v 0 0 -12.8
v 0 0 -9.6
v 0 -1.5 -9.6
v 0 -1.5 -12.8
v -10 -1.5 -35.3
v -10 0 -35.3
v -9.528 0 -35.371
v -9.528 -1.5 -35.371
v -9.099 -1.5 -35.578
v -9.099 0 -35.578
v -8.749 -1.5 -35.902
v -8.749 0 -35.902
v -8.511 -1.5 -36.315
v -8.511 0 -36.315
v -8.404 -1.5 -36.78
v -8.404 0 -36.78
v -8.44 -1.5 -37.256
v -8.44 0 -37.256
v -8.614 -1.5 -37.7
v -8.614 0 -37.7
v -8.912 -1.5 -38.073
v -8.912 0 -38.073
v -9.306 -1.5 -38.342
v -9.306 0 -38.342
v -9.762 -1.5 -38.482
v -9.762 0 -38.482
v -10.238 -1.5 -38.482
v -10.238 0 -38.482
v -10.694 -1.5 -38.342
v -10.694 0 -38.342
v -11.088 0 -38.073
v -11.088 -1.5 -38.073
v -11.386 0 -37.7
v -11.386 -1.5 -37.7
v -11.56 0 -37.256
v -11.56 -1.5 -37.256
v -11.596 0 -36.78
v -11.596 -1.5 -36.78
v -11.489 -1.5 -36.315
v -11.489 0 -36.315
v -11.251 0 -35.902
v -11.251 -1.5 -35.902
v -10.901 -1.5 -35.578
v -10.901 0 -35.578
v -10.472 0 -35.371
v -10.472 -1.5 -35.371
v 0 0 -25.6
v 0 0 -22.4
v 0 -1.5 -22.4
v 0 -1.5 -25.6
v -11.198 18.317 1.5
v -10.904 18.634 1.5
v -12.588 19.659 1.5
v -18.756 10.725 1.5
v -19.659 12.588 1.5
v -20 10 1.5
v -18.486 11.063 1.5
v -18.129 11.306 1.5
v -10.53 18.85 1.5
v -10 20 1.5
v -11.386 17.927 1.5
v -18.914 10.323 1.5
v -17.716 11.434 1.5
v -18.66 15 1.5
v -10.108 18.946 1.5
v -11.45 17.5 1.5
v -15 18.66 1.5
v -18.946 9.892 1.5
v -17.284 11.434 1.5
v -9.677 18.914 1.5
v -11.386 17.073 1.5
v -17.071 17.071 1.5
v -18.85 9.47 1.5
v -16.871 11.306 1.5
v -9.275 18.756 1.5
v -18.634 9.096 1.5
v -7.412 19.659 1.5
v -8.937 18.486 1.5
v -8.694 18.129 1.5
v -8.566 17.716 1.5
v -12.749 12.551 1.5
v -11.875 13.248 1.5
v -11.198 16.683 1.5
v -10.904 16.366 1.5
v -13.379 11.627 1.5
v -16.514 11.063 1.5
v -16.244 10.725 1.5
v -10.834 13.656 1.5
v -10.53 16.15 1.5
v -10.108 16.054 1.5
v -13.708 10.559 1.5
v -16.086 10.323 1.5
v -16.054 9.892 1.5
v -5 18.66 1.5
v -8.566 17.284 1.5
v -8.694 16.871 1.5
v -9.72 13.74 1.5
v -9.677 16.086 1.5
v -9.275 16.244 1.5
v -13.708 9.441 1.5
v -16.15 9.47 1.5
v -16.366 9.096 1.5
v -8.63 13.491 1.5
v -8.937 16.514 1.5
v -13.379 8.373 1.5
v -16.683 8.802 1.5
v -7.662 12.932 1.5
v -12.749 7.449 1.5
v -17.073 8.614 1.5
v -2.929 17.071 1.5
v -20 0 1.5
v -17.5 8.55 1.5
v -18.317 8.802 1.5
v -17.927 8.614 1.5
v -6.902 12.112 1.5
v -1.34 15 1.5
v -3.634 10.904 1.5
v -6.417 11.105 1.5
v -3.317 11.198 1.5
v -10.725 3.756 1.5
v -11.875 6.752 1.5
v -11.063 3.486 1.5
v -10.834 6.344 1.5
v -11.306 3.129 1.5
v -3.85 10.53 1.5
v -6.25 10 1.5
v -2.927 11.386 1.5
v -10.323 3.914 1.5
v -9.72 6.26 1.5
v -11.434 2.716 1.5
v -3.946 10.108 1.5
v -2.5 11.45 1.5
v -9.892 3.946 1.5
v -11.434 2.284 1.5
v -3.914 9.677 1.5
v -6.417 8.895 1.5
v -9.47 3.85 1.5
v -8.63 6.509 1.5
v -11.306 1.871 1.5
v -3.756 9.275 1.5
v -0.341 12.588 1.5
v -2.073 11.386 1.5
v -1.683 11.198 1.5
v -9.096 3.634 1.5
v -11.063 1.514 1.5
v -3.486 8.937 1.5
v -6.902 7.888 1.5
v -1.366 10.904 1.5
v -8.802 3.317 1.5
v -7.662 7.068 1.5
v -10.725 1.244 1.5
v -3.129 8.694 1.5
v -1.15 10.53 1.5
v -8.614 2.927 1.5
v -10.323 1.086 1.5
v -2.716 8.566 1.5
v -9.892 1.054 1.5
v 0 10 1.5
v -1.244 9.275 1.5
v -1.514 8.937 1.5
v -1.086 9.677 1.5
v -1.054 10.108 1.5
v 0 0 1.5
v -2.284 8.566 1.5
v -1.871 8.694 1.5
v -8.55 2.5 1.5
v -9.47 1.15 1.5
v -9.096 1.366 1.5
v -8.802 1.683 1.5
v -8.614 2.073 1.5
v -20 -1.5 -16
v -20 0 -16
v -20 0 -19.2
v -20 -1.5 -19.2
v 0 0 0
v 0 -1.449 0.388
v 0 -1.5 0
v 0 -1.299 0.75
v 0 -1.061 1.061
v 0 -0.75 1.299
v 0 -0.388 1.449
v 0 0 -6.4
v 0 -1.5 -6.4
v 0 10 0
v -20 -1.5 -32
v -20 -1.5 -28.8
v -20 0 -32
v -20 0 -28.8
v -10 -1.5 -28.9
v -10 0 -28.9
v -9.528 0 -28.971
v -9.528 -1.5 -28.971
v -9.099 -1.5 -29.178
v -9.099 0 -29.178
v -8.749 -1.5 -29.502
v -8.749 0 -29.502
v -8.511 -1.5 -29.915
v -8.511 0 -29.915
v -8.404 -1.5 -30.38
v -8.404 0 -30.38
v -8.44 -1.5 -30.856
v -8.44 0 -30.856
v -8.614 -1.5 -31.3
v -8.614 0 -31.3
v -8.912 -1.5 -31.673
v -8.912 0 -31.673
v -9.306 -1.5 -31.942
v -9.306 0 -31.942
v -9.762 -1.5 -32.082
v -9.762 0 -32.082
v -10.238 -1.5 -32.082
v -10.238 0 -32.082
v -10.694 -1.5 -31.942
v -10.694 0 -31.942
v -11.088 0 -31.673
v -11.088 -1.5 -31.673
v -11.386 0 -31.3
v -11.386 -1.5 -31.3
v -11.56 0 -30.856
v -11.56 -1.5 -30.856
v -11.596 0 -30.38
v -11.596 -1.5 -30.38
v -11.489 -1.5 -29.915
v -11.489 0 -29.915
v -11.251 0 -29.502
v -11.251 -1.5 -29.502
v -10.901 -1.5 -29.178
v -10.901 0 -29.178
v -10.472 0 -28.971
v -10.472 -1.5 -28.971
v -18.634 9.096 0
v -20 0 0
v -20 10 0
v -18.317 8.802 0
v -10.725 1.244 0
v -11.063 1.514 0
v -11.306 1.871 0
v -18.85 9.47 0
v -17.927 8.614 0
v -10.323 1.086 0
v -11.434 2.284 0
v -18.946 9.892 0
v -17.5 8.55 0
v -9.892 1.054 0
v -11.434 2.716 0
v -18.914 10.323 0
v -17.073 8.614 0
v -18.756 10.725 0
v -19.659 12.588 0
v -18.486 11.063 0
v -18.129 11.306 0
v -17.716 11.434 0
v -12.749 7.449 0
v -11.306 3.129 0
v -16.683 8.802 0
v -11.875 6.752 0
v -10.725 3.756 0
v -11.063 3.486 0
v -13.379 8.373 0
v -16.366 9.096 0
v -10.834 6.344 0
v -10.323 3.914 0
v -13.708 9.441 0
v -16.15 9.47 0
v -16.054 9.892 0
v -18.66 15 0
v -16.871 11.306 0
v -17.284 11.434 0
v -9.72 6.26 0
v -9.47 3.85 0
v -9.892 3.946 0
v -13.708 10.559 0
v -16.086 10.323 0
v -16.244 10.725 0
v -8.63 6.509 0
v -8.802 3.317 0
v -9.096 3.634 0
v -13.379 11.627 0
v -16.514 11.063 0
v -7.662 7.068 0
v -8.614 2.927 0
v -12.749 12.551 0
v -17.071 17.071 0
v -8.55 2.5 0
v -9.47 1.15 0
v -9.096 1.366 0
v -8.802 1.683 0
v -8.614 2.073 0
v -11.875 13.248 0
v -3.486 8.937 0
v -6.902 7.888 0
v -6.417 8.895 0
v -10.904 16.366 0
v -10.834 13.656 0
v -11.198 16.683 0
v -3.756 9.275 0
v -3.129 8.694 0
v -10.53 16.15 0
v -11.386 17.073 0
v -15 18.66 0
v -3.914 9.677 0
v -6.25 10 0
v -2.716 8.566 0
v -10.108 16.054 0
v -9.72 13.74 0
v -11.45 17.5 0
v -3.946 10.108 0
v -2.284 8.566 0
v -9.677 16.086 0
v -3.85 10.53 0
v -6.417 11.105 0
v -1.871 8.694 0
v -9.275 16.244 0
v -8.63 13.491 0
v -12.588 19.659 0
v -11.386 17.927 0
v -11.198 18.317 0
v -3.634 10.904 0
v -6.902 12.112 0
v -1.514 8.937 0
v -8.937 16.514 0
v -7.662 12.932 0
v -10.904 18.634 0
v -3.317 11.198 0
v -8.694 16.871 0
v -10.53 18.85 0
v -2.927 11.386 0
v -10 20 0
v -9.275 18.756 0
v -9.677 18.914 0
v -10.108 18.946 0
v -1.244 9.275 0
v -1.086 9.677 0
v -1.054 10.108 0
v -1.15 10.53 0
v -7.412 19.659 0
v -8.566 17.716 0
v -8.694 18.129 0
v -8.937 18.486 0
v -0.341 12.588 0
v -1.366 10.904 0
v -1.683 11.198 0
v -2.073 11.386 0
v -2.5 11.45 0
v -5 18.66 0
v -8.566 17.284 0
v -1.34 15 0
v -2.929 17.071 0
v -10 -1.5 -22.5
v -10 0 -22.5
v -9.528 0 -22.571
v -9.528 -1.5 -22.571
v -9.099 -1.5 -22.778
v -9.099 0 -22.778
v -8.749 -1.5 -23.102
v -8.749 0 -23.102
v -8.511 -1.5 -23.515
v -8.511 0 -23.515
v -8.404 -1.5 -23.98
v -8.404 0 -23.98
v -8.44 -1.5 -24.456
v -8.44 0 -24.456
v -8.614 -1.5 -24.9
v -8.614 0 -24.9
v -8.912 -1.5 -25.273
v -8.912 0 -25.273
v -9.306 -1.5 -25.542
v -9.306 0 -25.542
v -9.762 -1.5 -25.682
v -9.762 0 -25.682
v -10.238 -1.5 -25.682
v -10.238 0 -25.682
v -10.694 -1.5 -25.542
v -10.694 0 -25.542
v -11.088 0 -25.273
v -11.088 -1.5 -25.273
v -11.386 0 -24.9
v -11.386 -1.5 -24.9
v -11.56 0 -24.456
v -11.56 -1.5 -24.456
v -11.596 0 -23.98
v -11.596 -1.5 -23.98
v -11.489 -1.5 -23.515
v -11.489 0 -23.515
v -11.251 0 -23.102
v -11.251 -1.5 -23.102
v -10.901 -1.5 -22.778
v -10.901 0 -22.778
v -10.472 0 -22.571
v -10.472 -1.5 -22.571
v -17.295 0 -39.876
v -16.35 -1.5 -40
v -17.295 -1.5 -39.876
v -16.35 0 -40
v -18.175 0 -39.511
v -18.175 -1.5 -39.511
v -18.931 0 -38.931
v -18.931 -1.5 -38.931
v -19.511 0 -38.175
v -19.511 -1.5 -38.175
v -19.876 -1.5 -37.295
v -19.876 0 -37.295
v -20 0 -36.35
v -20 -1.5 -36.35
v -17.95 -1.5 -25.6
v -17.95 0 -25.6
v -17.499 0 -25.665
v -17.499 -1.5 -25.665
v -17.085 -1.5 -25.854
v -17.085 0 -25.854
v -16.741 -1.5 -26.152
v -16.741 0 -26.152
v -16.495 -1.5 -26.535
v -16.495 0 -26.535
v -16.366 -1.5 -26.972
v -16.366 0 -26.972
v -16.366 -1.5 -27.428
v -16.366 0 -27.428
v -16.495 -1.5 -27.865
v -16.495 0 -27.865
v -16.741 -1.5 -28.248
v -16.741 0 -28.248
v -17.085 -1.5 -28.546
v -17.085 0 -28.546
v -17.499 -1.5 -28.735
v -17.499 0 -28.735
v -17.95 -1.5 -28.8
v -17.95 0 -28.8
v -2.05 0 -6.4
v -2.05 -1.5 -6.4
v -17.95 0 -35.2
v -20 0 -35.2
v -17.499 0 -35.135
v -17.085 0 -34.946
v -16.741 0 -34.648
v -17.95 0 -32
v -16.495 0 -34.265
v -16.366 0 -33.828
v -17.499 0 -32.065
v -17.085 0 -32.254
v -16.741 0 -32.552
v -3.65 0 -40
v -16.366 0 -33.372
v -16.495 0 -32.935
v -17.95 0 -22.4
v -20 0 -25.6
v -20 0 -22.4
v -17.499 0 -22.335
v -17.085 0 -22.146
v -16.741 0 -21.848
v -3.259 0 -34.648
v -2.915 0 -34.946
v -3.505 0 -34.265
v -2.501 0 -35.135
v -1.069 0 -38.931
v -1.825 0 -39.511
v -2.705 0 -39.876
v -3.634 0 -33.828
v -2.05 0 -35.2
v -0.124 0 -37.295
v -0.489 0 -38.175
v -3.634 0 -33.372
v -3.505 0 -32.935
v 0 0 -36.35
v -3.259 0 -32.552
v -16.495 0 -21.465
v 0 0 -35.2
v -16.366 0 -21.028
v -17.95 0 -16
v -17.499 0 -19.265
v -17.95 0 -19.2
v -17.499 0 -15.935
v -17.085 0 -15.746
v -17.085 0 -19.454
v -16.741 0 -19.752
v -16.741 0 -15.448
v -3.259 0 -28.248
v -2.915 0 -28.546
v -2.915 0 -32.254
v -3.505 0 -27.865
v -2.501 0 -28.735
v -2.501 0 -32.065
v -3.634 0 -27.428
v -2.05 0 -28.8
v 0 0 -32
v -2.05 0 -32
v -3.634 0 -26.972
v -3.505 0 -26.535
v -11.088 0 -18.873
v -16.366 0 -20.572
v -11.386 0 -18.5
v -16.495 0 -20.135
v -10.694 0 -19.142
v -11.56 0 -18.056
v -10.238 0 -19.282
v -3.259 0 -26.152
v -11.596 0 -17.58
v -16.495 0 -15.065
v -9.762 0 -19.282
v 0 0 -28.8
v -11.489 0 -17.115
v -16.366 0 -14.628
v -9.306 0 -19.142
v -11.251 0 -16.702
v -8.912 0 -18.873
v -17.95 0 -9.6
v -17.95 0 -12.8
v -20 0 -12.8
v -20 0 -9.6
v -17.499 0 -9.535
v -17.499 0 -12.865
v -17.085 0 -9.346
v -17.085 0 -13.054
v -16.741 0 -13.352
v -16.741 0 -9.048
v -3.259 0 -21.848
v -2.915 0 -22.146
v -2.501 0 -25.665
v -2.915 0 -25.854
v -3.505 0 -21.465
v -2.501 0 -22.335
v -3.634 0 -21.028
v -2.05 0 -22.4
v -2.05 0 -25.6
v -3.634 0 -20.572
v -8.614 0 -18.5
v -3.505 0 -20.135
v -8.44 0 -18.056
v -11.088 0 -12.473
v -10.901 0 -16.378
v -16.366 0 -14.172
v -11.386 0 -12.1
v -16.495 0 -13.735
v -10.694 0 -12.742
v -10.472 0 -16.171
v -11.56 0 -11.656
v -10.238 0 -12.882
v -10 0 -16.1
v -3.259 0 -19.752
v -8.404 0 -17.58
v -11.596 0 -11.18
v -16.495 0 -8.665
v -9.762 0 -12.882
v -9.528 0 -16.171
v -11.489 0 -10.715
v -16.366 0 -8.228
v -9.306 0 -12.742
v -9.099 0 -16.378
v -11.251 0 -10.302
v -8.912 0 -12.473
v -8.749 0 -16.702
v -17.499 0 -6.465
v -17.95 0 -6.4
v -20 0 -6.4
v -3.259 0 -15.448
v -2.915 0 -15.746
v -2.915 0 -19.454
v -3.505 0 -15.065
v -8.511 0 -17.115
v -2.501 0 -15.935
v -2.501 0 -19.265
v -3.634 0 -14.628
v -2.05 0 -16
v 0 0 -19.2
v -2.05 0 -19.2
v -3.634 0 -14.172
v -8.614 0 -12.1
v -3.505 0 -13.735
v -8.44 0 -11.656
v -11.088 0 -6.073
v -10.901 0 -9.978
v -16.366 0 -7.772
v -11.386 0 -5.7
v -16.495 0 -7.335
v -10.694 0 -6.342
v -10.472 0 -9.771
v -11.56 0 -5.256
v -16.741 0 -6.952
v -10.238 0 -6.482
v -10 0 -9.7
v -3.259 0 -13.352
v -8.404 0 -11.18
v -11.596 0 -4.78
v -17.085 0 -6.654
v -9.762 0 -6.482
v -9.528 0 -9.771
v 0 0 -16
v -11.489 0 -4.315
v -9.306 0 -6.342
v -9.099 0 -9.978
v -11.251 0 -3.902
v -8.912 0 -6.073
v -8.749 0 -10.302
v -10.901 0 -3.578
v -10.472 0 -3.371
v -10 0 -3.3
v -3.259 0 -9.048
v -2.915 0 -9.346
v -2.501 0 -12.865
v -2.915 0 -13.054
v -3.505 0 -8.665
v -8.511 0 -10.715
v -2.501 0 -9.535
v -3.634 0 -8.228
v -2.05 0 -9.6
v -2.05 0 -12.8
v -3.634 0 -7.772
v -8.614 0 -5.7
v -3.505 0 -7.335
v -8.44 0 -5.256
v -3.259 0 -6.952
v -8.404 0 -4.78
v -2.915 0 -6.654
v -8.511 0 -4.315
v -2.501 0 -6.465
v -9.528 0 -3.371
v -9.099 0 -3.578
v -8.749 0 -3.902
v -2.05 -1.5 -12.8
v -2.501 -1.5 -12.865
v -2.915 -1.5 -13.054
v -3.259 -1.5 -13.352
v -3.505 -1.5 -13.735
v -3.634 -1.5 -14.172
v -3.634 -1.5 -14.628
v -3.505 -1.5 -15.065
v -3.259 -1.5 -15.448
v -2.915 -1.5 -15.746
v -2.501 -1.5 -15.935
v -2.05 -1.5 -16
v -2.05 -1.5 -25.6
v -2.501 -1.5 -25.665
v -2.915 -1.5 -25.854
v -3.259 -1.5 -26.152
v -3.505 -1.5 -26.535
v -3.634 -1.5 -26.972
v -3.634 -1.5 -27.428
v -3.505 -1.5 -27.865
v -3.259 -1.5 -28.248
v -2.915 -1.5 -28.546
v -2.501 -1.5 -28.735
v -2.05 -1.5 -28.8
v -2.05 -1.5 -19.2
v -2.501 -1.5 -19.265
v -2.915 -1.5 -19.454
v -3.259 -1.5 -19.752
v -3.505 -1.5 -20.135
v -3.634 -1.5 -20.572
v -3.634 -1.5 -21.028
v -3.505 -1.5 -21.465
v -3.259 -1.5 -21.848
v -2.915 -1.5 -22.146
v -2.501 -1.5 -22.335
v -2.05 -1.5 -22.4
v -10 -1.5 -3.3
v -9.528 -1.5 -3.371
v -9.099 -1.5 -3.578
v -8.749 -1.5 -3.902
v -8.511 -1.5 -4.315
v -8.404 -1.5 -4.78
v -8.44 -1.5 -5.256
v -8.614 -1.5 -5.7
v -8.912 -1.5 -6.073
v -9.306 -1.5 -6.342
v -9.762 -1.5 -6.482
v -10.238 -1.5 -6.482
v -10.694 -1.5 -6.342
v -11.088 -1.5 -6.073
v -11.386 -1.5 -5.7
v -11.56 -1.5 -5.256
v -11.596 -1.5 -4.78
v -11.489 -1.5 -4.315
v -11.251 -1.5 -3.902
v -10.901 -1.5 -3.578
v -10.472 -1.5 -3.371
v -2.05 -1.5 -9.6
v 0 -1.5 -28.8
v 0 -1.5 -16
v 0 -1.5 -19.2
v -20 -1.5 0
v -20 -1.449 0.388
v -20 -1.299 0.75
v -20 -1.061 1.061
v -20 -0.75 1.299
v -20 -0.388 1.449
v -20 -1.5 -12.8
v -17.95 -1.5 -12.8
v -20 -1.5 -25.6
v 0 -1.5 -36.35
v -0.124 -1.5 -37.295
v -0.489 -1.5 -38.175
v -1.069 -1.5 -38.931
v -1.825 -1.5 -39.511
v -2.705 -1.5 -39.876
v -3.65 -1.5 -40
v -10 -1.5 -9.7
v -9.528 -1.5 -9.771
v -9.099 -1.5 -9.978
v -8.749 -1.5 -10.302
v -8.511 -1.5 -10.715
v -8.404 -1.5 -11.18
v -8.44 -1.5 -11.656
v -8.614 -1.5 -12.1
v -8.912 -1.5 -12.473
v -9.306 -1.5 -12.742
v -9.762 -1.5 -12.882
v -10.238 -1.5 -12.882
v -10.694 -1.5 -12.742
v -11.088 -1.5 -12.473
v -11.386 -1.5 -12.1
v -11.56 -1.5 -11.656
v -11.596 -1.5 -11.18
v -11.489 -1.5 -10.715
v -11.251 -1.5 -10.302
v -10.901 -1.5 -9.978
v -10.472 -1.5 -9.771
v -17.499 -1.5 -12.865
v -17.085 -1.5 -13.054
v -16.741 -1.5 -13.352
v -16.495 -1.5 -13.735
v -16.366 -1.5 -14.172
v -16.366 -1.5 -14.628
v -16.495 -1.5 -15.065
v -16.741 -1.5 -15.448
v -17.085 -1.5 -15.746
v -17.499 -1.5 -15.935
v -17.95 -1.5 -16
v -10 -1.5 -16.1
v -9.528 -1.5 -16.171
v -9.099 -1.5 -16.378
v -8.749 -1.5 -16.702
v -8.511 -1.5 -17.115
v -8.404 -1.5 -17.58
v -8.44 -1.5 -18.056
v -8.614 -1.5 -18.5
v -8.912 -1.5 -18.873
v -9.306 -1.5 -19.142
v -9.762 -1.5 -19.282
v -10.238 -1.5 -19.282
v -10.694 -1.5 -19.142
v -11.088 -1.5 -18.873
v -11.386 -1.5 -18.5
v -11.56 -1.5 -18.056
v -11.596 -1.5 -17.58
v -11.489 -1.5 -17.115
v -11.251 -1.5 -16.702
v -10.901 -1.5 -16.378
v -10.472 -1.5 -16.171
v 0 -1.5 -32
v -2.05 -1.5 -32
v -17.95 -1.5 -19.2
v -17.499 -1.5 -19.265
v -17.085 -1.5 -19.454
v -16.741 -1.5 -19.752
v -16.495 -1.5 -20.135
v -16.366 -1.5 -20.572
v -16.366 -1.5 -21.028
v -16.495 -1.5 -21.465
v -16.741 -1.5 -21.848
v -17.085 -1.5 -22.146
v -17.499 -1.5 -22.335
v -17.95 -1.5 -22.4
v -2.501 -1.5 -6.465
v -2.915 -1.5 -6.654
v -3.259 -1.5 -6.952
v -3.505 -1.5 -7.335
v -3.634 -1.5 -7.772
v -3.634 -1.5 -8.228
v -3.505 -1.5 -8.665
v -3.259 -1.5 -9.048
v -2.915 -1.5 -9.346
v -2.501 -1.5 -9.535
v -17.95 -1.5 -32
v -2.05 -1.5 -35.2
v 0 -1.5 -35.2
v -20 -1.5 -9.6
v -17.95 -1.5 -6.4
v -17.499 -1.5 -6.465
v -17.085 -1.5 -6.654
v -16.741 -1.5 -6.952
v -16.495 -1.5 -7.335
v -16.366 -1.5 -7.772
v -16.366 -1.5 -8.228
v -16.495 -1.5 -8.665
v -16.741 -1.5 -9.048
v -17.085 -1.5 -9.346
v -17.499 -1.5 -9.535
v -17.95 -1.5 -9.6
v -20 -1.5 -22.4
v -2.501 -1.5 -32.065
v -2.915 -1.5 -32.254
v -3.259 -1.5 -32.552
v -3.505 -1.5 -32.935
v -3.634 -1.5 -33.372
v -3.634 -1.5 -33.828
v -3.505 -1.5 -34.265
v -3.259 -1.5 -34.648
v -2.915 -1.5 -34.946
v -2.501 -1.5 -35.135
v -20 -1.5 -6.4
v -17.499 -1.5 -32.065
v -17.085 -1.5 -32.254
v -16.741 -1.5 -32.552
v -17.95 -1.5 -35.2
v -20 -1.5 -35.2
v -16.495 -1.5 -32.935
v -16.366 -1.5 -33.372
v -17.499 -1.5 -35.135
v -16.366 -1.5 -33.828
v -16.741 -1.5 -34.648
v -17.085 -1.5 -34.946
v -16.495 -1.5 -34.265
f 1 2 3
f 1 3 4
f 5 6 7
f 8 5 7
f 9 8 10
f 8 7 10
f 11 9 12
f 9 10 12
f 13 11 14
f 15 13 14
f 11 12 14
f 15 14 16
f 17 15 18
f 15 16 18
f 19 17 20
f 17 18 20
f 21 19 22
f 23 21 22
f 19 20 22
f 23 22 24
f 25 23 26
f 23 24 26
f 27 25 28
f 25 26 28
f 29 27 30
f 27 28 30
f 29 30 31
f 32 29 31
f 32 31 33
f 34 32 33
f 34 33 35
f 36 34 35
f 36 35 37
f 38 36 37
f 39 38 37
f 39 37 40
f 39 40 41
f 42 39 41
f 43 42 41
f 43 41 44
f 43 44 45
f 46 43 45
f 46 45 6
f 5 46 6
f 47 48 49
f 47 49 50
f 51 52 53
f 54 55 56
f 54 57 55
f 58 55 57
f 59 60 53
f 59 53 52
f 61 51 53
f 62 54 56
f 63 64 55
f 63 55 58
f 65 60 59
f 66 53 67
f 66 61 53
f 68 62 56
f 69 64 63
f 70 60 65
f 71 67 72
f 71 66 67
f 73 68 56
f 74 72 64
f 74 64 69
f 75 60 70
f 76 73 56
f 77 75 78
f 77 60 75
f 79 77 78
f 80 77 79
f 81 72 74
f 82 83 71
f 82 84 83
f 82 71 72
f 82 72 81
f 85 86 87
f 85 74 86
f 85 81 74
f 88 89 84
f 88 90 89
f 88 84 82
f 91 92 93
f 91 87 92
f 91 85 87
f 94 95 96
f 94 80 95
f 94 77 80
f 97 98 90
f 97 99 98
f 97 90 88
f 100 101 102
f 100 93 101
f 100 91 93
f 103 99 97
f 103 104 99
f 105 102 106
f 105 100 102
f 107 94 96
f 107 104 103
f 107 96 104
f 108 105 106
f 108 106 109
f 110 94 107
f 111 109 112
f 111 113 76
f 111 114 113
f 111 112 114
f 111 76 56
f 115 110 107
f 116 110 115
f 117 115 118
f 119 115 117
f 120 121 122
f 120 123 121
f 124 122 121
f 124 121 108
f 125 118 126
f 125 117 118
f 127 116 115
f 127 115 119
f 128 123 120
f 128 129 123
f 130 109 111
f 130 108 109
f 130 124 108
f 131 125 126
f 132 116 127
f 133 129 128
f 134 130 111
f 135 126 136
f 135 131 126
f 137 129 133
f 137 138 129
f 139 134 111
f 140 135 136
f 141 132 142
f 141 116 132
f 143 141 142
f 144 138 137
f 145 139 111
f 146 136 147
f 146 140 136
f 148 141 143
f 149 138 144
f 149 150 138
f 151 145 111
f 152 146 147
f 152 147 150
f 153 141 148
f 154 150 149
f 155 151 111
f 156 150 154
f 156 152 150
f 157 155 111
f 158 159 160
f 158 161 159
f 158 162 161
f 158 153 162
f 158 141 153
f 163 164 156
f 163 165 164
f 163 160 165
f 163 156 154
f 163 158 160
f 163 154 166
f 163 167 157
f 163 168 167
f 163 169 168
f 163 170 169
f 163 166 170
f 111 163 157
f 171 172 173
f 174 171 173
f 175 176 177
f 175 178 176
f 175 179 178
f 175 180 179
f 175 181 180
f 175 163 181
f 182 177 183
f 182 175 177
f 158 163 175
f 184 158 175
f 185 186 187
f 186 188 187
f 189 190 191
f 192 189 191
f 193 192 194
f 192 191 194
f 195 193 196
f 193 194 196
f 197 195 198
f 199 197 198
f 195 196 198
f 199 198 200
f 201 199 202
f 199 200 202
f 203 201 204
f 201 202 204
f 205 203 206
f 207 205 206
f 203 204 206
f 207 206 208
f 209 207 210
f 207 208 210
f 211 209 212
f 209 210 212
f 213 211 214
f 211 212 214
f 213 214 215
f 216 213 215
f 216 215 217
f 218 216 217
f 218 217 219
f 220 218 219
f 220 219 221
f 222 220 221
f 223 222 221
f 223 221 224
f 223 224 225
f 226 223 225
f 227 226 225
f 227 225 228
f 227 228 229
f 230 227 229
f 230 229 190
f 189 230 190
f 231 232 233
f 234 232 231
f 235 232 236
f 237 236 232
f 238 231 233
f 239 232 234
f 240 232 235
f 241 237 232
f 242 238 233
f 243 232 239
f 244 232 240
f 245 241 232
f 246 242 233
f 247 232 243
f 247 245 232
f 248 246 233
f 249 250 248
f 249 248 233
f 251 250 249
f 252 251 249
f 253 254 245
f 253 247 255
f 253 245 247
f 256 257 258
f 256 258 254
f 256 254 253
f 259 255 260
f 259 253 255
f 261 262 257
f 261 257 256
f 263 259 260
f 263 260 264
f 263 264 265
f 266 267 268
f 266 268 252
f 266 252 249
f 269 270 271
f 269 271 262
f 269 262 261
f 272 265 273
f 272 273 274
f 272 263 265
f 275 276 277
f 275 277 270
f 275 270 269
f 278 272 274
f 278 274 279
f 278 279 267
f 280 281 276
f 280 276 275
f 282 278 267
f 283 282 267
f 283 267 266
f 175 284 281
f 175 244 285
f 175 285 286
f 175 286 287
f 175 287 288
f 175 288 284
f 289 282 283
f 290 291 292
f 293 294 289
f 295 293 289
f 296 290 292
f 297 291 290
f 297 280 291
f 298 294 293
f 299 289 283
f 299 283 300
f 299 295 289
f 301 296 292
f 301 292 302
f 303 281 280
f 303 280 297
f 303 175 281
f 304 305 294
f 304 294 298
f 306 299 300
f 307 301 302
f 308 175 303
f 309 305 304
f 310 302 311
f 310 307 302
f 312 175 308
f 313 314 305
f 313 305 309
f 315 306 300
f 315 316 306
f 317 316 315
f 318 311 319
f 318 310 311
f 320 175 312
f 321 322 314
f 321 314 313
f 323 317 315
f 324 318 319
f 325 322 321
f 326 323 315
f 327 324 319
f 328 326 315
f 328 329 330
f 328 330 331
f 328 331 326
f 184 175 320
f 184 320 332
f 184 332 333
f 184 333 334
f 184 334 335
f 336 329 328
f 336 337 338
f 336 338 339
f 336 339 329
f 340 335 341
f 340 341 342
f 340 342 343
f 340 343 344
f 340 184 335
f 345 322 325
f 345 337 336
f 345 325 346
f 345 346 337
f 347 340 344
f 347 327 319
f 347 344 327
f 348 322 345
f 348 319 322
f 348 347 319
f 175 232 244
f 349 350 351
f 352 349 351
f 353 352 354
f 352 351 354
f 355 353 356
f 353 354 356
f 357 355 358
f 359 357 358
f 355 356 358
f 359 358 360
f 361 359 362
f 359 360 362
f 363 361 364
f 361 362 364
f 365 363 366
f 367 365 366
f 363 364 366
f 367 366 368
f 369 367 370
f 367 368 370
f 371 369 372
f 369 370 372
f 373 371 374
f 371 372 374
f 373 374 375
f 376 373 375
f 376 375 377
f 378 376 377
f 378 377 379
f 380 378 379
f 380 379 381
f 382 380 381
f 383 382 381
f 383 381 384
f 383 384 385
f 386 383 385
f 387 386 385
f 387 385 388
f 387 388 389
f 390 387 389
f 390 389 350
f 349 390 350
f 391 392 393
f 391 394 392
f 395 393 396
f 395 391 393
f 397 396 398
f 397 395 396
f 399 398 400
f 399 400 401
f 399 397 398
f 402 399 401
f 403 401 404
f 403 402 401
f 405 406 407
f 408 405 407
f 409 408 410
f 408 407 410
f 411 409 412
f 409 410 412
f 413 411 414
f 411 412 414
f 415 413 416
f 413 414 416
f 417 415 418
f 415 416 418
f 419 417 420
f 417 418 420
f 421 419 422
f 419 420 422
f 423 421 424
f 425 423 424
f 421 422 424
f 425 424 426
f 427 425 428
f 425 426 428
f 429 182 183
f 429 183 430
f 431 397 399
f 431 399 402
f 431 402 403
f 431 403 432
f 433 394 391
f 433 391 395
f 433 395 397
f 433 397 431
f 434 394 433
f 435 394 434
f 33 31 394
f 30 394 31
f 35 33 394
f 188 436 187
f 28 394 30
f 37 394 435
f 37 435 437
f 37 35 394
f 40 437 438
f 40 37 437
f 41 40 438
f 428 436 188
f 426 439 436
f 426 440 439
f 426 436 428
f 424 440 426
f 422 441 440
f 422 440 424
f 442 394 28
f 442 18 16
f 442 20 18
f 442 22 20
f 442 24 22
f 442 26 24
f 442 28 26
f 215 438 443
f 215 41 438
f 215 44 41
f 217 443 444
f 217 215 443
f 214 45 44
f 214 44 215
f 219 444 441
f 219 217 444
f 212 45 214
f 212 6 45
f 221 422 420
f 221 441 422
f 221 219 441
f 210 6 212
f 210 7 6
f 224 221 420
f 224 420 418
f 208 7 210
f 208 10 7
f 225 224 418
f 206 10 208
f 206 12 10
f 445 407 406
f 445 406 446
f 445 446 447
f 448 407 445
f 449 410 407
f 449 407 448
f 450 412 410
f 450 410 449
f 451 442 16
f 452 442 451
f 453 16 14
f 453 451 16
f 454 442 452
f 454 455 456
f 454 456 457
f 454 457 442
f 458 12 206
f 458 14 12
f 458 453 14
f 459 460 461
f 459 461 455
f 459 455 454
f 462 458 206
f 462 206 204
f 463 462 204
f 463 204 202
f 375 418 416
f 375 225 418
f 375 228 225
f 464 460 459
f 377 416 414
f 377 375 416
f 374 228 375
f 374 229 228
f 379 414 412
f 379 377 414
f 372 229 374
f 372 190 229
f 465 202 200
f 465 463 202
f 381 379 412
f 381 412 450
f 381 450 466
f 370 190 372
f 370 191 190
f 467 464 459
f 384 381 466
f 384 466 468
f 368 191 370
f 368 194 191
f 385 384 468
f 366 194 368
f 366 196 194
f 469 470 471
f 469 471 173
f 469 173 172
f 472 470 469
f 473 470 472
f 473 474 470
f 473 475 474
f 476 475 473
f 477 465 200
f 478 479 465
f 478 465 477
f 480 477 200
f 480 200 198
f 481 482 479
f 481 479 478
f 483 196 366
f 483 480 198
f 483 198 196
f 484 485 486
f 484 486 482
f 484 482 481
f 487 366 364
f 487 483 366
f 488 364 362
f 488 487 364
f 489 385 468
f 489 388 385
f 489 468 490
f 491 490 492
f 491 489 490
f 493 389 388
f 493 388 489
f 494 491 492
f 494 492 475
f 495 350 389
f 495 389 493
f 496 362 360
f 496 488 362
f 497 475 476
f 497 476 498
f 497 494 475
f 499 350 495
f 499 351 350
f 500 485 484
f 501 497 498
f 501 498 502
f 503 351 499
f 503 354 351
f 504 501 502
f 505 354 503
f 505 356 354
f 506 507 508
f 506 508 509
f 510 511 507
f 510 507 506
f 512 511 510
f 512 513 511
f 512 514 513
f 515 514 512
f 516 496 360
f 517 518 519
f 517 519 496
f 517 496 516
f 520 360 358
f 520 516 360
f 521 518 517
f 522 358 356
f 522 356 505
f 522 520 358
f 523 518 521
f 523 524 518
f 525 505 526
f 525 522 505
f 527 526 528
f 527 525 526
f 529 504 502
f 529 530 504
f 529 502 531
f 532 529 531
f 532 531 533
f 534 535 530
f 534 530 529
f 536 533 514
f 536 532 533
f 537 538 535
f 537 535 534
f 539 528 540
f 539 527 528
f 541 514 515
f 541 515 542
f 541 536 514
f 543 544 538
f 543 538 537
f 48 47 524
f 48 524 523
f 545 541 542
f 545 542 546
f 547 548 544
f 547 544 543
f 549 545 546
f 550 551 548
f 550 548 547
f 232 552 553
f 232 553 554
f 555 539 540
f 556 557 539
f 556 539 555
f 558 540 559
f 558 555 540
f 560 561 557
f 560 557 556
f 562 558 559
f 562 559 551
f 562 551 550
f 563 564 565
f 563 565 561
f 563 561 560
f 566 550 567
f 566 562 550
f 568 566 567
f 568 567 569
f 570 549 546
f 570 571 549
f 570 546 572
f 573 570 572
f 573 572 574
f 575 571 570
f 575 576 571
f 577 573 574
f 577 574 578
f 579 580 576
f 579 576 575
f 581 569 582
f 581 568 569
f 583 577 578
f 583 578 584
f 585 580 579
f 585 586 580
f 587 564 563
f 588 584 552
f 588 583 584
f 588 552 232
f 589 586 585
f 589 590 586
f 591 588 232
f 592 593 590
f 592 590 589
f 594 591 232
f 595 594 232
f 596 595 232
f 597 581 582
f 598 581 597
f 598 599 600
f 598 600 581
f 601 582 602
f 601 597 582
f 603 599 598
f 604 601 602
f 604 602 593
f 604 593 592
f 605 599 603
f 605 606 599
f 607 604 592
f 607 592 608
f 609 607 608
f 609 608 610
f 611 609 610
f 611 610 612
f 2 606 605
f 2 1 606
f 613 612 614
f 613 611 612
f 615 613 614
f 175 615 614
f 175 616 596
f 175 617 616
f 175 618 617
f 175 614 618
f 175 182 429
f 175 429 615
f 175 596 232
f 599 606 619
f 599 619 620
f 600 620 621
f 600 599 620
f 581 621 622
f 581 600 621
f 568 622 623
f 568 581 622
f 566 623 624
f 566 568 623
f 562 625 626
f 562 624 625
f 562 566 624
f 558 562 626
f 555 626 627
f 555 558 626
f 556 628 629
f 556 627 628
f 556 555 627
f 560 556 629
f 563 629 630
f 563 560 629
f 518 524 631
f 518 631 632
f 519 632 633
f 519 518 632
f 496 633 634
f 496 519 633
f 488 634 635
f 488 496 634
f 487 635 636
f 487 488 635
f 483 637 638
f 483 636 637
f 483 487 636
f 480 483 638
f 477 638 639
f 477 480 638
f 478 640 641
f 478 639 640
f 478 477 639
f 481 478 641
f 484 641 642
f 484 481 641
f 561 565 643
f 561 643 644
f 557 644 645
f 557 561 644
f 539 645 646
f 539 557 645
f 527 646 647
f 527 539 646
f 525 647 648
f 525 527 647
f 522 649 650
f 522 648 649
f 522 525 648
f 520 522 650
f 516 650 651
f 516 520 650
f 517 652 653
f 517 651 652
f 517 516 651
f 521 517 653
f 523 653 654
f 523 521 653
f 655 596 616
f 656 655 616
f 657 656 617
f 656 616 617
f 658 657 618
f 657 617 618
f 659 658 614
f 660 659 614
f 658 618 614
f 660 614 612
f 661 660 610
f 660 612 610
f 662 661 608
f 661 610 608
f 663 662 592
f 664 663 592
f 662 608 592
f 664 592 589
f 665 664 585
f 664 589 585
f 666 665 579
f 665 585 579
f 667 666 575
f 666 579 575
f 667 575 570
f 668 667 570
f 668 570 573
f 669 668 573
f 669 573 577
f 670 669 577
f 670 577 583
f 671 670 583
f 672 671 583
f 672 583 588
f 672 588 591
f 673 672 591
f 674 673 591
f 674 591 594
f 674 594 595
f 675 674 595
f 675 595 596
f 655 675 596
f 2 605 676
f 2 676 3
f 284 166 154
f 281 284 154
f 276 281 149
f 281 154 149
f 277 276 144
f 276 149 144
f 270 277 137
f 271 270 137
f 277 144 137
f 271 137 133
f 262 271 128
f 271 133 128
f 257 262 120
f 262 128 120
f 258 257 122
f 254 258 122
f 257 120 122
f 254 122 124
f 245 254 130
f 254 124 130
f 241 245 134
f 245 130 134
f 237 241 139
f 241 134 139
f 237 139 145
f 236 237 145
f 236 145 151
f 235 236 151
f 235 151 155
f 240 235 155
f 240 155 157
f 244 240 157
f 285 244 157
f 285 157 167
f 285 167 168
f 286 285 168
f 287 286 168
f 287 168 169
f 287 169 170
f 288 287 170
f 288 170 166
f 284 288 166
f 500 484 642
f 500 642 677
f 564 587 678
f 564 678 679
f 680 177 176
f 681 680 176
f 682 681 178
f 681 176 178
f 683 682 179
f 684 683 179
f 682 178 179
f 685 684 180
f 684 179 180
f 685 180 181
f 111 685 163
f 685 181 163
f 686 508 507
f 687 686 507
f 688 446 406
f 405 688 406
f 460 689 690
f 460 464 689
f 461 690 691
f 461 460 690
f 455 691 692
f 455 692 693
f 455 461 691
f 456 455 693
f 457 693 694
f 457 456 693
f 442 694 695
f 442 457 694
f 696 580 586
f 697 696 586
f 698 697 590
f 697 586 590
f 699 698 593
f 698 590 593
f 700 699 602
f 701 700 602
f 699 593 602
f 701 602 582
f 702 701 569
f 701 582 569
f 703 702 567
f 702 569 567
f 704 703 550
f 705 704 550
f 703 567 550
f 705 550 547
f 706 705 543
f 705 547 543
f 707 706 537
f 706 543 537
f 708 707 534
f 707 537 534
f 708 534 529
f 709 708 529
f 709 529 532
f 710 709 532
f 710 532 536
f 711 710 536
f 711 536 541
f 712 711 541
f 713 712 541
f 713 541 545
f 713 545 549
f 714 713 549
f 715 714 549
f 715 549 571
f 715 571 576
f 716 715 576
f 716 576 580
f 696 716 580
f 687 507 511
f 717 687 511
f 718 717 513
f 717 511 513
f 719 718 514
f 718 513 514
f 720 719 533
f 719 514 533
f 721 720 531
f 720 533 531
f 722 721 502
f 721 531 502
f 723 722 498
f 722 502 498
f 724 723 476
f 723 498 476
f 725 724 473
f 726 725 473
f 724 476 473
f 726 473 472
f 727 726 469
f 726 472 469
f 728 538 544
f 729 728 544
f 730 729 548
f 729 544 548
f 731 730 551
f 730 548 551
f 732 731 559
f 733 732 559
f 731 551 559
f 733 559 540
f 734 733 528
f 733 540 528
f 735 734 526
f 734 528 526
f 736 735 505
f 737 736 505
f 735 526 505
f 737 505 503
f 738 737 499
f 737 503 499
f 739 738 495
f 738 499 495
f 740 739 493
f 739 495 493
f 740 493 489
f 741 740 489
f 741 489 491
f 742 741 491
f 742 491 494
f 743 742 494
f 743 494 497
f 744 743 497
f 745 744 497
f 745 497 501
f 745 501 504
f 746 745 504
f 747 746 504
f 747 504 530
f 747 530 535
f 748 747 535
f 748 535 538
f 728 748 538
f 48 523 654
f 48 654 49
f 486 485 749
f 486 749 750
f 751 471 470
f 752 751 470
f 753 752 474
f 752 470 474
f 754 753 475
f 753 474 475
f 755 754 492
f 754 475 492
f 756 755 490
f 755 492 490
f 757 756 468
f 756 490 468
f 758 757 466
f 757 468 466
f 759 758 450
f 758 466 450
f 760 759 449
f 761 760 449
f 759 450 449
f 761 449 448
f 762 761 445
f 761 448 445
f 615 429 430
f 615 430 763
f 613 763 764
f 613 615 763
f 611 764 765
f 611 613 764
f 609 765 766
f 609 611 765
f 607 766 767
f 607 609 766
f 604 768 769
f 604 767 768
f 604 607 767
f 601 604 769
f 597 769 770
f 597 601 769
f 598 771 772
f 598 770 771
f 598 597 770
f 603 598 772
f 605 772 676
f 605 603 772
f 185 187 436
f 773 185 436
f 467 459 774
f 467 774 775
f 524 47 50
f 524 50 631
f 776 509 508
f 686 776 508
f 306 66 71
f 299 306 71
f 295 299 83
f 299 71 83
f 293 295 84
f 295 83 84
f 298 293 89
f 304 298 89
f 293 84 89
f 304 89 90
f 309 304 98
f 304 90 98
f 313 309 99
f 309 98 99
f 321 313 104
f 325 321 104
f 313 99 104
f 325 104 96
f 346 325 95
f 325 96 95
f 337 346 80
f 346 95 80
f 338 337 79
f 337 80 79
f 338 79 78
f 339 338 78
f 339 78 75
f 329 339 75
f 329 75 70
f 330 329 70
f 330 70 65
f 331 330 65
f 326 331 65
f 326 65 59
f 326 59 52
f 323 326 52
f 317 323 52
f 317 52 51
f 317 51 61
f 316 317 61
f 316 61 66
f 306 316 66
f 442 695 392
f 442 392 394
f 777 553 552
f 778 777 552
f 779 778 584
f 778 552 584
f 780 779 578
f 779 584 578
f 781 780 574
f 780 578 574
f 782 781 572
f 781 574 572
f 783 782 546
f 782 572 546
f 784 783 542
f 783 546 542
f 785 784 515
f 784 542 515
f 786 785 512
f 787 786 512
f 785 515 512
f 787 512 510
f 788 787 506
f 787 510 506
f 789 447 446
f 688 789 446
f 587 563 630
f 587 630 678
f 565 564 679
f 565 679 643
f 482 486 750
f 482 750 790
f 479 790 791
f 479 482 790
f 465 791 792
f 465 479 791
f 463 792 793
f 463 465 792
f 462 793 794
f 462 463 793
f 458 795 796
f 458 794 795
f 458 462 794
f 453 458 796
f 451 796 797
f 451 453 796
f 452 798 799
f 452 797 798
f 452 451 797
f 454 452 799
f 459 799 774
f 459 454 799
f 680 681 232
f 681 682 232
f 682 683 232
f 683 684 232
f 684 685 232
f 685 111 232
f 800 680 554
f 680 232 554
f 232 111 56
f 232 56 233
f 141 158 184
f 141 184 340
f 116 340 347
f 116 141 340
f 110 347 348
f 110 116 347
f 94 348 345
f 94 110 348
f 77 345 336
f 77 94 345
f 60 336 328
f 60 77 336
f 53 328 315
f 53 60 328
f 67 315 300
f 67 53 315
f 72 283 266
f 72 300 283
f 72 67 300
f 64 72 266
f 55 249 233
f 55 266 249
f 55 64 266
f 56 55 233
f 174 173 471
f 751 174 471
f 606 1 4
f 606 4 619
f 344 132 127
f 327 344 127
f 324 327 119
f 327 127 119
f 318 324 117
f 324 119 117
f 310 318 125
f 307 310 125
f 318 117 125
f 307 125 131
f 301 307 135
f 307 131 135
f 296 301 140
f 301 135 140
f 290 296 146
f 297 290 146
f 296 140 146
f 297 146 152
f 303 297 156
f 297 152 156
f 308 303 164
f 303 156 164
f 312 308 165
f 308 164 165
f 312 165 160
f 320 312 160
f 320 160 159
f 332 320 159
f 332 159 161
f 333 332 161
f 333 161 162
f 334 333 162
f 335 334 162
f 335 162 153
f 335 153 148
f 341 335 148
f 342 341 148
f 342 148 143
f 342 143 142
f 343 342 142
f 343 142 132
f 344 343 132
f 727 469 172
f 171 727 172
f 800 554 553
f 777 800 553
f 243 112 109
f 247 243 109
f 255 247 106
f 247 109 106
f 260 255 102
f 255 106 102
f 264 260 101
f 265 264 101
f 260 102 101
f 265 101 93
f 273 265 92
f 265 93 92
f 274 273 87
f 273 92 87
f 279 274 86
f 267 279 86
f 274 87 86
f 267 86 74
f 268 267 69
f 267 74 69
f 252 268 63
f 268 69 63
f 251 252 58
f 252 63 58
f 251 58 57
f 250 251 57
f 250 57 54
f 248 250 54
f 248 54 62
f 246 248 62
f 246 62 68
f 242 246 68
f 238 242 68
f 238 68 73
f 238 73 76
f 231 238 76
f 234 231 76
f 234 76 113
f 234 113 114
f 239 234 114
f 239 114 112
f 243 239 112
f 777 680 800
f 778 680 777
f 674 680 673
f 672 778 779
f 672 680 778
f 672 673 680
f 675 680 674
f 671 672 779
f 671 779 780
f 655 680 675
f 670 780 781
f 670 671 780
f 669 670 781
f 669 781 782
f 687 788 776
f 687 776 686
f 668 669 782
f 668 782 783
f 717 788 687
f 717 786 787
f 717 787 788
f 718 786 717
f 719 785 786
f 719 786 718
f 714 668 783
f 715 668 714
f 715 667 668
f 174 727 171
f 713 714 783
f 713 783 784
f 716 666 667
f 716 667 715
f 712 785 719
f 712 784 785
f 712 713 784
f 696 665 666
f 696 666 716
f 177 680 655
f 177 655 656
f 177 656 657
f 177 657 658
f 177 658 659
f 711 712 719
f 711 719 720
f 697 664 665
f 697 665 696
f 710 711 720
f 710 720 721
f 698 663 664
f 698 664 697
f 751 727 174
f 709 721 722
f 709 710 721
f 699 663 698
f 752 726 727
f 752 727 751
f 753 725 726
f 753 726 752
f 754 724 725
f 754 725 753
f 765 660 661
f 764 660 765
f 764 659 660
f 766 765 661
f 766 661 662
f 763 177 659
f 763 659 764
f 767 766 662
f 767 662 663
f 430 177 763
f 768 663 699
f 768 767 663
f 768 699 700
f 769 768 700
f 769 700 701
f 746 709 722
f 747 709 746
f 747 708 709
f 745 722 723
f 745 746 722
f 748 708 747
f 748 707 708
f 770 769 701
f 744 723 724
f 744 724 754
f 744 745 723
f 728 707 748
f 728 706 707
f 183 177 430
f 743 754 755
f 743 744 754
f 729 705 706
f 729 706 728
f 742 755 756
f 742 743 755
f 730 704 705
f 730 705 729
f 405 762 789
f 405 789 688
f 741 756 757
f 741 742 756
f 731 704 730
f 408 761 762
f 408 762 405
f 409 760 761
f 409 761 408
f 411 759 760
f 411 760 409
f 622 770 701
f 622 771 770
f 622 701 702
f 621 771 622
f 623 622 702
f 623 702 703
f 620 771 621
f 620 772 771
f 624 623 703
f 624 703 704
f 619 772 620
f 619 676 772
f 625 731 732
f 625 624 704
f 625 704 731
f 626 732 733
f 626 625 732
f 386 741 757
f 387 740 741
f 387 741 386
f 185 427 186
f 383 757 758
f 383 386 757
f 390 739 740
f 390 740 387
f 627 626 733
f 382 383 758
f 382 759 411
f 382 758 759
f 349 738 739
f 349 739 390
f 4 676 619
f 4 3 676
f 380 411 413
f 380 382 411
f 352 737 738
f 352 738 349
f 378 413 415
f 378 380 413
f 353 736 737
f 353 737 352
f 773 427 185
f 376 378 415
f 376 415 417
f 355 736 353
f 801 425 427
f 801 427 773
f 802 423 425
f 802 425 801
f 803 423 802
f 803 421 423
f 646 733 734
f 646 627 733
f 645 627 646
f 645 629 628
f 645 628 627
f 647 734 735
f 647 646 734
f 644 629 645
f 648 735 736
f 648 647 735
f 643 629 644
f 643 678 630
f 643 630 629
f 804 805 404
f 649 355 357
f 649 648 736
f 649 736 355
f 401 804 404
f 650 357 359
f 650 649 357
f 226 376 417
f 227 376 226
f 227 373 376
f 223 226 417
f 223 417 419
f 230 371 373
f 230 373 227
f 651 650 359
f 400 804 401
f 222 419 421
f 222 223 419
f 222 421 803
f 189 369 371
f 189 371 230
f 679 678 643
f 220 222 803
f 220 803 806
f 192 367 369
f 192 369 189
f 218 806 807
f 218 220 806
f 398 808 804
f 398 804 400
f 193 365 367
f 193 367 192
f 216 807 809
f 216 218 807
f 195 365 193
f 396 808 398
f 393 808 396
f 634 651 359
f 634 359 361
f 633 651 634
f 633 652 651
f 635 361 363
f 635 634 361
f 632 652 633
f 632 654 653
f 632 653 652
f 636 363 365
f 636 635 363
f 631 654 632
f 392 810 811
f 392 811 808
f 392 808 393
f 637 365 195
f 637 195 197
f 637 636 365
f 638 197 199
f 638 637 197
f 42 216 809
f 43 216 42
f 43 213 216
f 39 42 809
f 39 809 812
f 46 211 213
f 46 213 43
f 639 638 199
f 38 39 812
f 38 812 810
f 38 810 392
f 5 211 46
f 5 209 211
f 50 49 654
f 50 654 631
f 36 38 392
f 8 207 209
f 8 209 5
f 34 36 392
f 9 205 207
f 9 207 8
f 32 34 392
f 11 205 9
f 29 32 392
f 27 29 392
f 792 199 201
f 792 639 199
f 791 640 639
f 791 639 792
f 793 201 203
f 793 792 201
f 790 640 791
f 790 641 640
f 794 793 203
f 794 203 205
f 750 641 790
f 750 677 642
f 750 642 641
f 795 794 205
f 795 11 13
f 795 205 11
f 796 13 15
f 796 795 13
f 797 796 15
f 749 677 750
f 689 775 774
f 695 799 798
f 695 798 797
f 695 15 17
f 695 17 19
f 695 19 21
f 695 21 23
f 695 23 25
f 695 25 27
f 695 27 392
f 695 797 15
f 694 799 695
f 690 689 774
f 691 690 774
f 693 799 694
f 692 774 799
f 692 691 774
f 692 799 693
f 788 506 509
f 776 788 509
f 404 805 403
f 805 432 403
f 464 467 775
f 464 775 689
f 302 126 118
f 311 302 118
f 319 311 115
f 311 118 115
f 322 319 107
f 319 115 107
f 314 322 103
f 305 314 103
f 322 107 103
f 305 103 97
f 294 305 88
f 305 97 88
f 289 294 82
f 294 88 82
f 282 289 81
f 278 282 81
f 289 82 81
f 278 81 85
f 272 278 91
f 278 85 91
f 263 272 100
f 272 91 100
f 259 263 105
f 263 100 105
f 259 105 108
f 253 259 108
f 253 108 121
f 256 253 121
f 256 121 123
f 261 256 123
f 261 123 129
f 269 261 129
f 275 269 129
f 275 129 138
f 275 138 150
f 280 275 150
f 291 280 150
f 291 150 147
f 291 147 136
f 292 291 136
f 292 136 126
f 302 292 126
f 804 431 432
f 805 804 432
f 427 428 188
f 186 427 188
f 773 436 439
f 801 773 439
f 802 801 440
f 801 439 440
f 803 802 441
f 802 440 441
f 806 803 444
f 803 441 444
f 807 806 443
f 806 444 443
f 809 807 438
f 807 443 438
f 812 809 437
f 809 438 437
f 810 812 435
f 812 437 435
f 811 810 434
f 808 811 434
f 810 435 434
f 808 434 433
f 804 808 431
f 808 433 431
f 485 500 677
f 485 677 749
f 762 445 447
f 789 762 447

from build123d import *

# Parameters (mm, degrees)
BOSS_EXTRUDE1_DEPTH  = 20
CUT_EXTRUDE2_DEPTH   = 20
CUT_EXTRUDE3_DEPTH   = 20
SKETCH4_R            = 3.75
CUT_EXTRUDE4_DEPTH   = 20
SKETCH5_R            = 1.45
CUT_EXTRUDE5_DEPTH   = 20
CIRPATTERN1_COUNT    = 4
SKETCH6_R            = 1.6
CUT_EXTRUDE6_DEPTH   = 20
LPATTERN1_COUNT      = 6
LPATTERN1_PITCH      = 6.4
CUT_EXTRUDE7_DEPTH   = 20
LPATTERN2_COUNT      = 5
LPATTERN2_PITCH      = 6.4
MIRROR1_COPY_1_DEPTH = 20
MIRROR1_COPY_2_DEPTH = 20
MIRROR1_COPY_3_DEPTH = 20
MIRROR1_COPY_4_DEPTH = 20
FILLET3_R            = 3.65
FILLET4_R            = 3.65


with BuildPart() as part:
    # Sketch1 → Boss-Extrude1 (new body)
    with BuildSketch(Plane(origin=(0, 0, 0), x_dir=(0, 0, -1), z_dir=(1, 0, 0))):
        Polygon((0, 0), (0, 20), (-1.5, 20), (-1.5, -1.5), (40, -1.5), (40, 0), align=None)
    extrude(amount=-BOSS_EXTRUDE1_DEPTH)

    # Sketch2 → Cut-Extrude2 (cut)
    with BuildSketch(Plane(origin=(0, 0, 0), x_dir=(0, 0, -1), z_dir=(1, 0, 0))):
        with BuildLine():
            Line((-1.5, 0), (-1.5, -1.5))
            Line((-1.5, -1.5), (0, -1.5))
            ThreePointArc((0, -1.5), (-1.060660172, -1.060660172), (-1.5, 0))
        make_face()
    extrude(amount=-CUT_EXTRUDE2_DEPTH, mode=Mode.SUBTRACT)

    # Sketch3 → Cut-Extrude3 (cut)
    with BuildSketch(Plane.XY.offset(1.5)):
        with BuildLine():
            Line((-20, 10), (-20, 21.790535073))
            Line((-20, 21.790535073), (0, 21.790535073))
            Line((0, 21.790535073), (0, 10))
            ThreePointArc((0, 10), (-10, 20), (-20, 10))
        make_face()
    extrude(amount=-CUT_EXTRUDE3_DEPTH, mode=Mode.SUBTRACT)

    # Sketch4 → Cut-Extrude4 (cut)
    with BuildSketch(Plane.XY.offset(1.5)):
        with Locations((-10, 10)):
            Circle(SKETCH4_R)
    extrude(amount=-CUT_EXTRUDE4_DEPTH, mode=Mode.SUBTRACT)

    # Sketch5 → Cut-Extrude5 (cut)
    with BuildSketch(Plane.XY.offset(1.5)):
        with Locations((-10, 2.5)):
            Circle(SKETCH5_R)
    cut_extrude5 = extrude(amount=-CUT_EXTRUDE5_DEPTH, mode=Mode.SUBTRACT)

    # CirPattern1: Cut-Extrude5 ×4 about axis
    cirpattern1_axis = Axis((-10, 10, 0), (0, 0, 1))
    for i in range(1, CIRPATTERN1_COUNT):
        add(cut_extrude5.rotate(cirpattern1_axis, i * 360 / CIRPATTERN1_COUNT), mode=Mode.SUBTRACT)

    # Sketch6 → Cut-Extrude6 (cut)
    with BuildSketch(Plane(origin=(0, 0, 0), x_dir=(1, 0, 0), z_dir=(0, 1, 0))):
        with Locations(Location((-10, 4.9, 0), (0, 0, 270))):
            Circle(SKETCH6_R)
    cut_extrude6 = extrude(amount=-CUT_EXTRUDE6_DEPTH, mode=Mode.SUBTRACT)

    # LPattern1: Cut-Extrude6 ×6
    with Locations(*[(0, 0, -i * LPATTERN1_PITCH) for i in range(1, LPATTERN1_COUNT)]):
        add(cut_extrude6, mode=Mode.SUBTRACT)

    # Sketch7 → Cut-Extrude7 (cut)
    with BuildSketch(Plane(origin=(0, 0, 0), x_dir=(1, 0, 0), z_dir=(0, 1, 0))):
        with BuildLine():
            Line((0, 6.4), (-2.05, 6.4))
            ThreePointArc((-2.05, 6.4), (-3.65, 8), (-2.05, 9.6))
            Line((-2.05, 9.6), (0, 9.6))
            Line((0, 9.6), (0, 6.4))
        make_face()
    cut_extrude7 = extrude(amount=-CUT_EXTRUDE7_DEPTH, mode=Mode.SUBTRACT)

    # LPattern2: Cut-Extrude7 ×5
    with Locations(*[(0, 0, -i * LPATTERN2_PITCH) for i in range(1, LPATTERN2_COUNT)]):
        add(cut_extrude7, mode=Mode.SUBTRACT)

    # Mirror1: Cut-Extrude7 across plane
    add(cut_extrude7.mirror(Plane.ZY.offset(10)), mode=Mode.SUBTRACT)

    # Mirror1 copy 1 sketch → Mirror1 copy 1 (cut)
    with BuildSketch(Plane(origin=(-20, 0, -6.4), x_dir=(-1, 0, 0), z_dir=(0, 1, 0))):
        with BuildLine():
            Line((0, -6.4), (-2.05, -6.4))
            ThreePointArc((-2.05, -6.4), (-3.65, -8), (-2.05, -9.6))
            Line((-2.05, -9.6), (0, -9.6))
            Line((0, -9.6), (0, -6.4))
        make_face()
    extrude(amount=-MIRROR1_COPY_1_DEPTH, mode=Mode.SUBTRACT)

    # Mirror1 copy 2 sketch → Mirror1 copy 2 (cut)
    with BuildSketch(Plane(origin=(-20, 0, -12.8), x_dir=(-1, 0, 0), z_dir=(0, 1, 0))):
        with BuildLine():
            Line((0, -6.4), (-2.05, -6.4))
            ThreePointArc((-2.05, -6.4), (-3.65, -8), (-2.05, -9.6))
            Line((-2.05, -9.6), (0, -9.6))
            Line((0, -9.6), (0, -6.4))
        make_face()
    extrude(amount=-MIRROR1_COPY_2_DEPTH, mode=Mode.SUBTRACT)

    # Mirror1 copy 3 sketch → Mirror1 copy 3 (cut)
    with BuildSketch(Plane(origin=(-20, 0, -19.2), x_dir=(-1, 0, 0), z_dir=(0, 1, 0))):
        with BuildLine():
            Line((0, -6.4), (-2.05, -6.4))
            ThreePointArc((-2.05, -6.4), (-3.65, -8), (-2.05, -9.6))
            Line((-2.05, -9.6), (0, -9.6))
            Line((0, -9.6), (0, -6.4))
        make_face()
    extrude(amount=-MIRROR1_COPY_3_DEPTH, mode=Mode.SUBTRACT)

    # Mirror1 copy 4 sketch → Mirror1 copy 4 (cut)
    with BuildSketch(Plane(origin=(-20, 0, -25.6), x_dir=(-1, 0, 0), z_dir=(0, 1, 0))):
        with BuildLine():
            Line((0, -6.4), (-2.05, -6.4))
            ThreePointArc((-2.05, -6.4), (-3.65, -8), (-2.05, -9.6))
            Line((-2.05, -9.6), (0, -9.6))
            Line((0, -9.6), (0, -6.4))
        make_face()
    extrude(amount=-MIRROR1_COPY_4_DEPTH, mode=Mode.SUBTRACT)

    # Fillet3
    fillet3_edges = [part.edges().sort_by_distance(p)[0] for p in [
        (0, -0.75, -40),
    ]]
    fillet(fillet3_edges, radius=FILLET3_R)

    # Fillet4
    fillet4_edges = [part.edges().sort_by_distance(p)[0] for p in [
        (-20, -0.75, -40),
    ]]
    fillet(fillet4_edges, radius=FILLET4_R)


solid = part.part
